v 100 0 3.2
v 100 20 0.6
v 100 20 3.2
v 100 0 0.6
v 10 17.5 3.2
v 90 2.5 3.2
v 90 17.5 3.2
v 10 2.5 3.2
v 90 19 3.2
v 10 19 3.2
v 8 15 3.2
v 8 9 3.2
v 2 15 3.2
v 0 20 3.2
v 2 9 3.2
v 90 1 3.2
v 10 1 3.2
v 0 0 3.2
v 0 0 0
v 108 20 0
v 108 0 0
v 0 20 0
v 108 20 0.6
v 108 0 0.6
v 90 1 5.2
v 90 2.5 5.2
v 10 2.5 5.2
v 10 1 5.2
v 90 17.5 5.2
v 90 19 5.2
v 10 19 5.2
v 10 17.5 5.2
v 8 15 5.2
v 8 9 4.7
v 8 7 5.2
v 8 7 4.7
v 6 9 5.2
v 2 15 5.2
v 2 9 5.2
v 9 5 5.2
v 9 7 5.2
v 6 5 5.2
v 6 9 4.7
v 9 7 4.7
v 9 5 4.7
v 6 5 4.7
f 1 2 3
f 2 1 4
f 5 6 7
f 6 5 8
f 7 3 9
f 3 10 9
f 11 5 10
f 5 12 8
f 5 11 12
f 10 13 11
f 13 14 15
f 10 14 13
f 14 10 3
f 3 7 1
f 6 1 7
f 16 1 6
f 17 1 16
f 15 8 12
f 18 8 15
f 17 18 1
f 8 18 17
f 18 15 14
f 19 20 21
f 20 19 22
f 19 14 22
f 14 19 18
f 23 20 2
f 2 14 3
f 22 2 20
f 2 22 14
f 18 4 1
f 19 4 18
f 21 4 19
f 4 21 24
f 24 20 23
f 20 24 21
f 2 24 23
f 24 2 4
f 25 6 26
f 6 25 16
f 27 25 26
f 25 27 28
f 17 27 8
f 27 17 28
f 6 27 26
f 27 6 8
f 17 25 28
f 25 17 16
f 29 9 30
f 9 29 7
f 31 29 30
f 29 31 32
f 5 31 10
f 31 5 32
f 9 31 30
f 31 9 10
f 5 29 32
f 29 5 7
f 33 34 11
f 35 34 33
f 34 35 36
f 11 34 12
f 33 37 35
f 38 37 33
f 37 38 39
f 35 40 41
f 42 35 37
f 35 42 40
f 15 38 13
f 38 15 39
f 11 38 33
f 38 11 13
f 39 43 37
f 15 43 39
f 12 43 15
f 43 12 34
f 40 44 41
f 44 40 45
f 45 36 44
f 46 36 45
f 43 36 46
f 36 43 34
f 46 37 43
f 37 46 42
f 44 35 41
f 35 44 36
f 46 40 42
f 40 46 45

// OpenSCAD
// Bag clip living hinge, PETG, 0.4 nozzle, no supports.
// Two halves contacting at hinge, open flat print pose.
// Fold: rotate upper 180 about [108,10,5.2] -Y. F(x)=216-x, F(z)=10.4-z.

part = "arm_lower"; // [arm_lower, arm_upper, assembly]
cadverify_only = "";

module instance(name, part, unit = 1) {
    echo(cadverify_instance = [name, part, unit]);
    if (cadverify_only == "" || cadverify_only == name) children();
}

module arm_lower() {
    cube([100, 20, 3.2], false);
    translate([99.9, 0, 0]) cube([8.1, 20, 0.6], false);
    translate([10, 1, 3.1]) cube([80, 1.5, 2.1], false);
    translate([10, 17.5, 3.1]) cube([80, 1.5, 2.1], false);
    // stop tower (central)
    translate([2, 9, 3.1]) cube([6, 6, 2.1], false);
    // lower hook base region uses body; hook lip + bridge
    translate([6, 5, 4.7]) cube([3, 2, 0.5], false);
    translate([6, 6.9, 4.7]) cube([2, 2.2, 0.5], false);
}

module arm_upper() {
    cube([8.2, 20, 0.6], false);
    translate([7.9, 0, 0]) cube([100.1, 20, 3.2], false);
    // stop tower (central) local x 102-106 -> folded 2-6
    translate([102, 9, 3.1]) cube([4, 6, 2.1], false);
    // upper hook post (Y 13-15) tall
    translate([102, 13, 3.1]) cube([4, 2, 3.3], false);
    // Y bridge 7-13
    translate([99, 6.9, 5.8]) cube([3.1, 6.2, 0.6], false);
    // upper hook lip (Y 5-7)
    translate([99, 5, 5.8]) cube([3.1, 2, 0.6], false);
    // thumb tab
    translate([107.9, 6, 0]) cube([8.1, 8, 3.2], false);
}

if (part == "arm_lower") {
    echo(cadverify_spec = [
        ["bounds", [[0, 0, 0], [108.1, 20, 5.2]]],
        ["bodies", 1],
        ["through_holes", 0],
        ["support_faces", [["bed", "-z", 1500]]],
        ["overhangs_allowed", [["latch lip", [[5.5, 4.5, 4.5], [9.5, 9.5, 5.5]]]]],
        ["copies", 1],
        ["details", [
            ["arm", "material", [[30, 10, 1.2], [70, 12, 2.0]], 1],
            ["arm_wall", "thickness", [50, 10, 10], [0, 0, -1], 3.2],
            ["hinge", "thickness", [104, 10, 5], [0, 0, -1], 0.6],
            ["rib", "material", [[30, 1.3, 3.8], [70, 2.2, 4.8]], 1],
            ["rib2", "material", [[30, 17.8, 3.8], [70, 18.7, 4.8]], 1],
            ["latch_tower", "material", [[3, 10, 3.8], [7, 14, 5.0]], 1],
            ["latch_lip", "material", [[6.5, 5.5, 4.8], [8.5, 6.5, 5.1]], 1],
            ["bag_slot", "void", [[30, 4, 3.8], [70, 16, 5.0]], 1]
        ]]
    ]);
    arm_lower();
} else if (part == "arm_upper") {
    echo(cadverify_spec = [
        ["bounds", [[0, 0, 0], [116, 20, 6.4]]],
        ["bodies", 1],
        ["through_holes", 0],
        ["support_faces", [["bed", "-z", 1500]]],
        ["overhangs_allowed", [["latch lip", [[98.5, 4.5, 5.6], [102.5, 13.5, 6.6]]]]],
        ["copies", 1],
        ["details", [
            ["arm", "material", [[30, 10, 1.2], [70, 12, 2.0]], 1],
            ["arm_wall", "thickness", [50, 10, 10], [0, 0, -1], 3.2],
            ["hinge", "thickness", [4, 10, 5], [0, 0, -1], 0.6],
            ["latch_tower", "material", [[102.5, 10, 3.8], [105.5, 14, 5.0]], 1],
            ["latch_lip", "material", [[99.5, 5.5, 5.9], [101.5, 6.5, 6.3]], 0.99],
            ["thumb_tab", "material", [[109, 7, 1.2], [114, 13, 2.0]], 0.99],
            ["field", "void", [[30, 4, 3.8], [70, 16, 5.0]], 1]
        ]]
    ]);
    arm_upper();
} else if (part == "assembly") {
    echo(cadverify_spec = [
        ["bounds", [[0, 0, 0], [224.0, 20, 6.4]]],
        ["support_faces", [["bed", "-z", 3000]]],
        ["motions", [
            ["close", ["upper"], "rotate", [108, 10, 5.2], [0, -1, 0], [0, 180],
                ["stops", [180]]
            ]
        ]],
        ["assembly_order", [
            [["lower"], [0, 0, 0]],
            [["upper"], [0, 0, -1]]
        ]]
    ]);
    instance("lower", "arm_lower") arm_lower();
    instance("upper", "arm_upper") translate([108, 0, 0]) arm_upper();
}
